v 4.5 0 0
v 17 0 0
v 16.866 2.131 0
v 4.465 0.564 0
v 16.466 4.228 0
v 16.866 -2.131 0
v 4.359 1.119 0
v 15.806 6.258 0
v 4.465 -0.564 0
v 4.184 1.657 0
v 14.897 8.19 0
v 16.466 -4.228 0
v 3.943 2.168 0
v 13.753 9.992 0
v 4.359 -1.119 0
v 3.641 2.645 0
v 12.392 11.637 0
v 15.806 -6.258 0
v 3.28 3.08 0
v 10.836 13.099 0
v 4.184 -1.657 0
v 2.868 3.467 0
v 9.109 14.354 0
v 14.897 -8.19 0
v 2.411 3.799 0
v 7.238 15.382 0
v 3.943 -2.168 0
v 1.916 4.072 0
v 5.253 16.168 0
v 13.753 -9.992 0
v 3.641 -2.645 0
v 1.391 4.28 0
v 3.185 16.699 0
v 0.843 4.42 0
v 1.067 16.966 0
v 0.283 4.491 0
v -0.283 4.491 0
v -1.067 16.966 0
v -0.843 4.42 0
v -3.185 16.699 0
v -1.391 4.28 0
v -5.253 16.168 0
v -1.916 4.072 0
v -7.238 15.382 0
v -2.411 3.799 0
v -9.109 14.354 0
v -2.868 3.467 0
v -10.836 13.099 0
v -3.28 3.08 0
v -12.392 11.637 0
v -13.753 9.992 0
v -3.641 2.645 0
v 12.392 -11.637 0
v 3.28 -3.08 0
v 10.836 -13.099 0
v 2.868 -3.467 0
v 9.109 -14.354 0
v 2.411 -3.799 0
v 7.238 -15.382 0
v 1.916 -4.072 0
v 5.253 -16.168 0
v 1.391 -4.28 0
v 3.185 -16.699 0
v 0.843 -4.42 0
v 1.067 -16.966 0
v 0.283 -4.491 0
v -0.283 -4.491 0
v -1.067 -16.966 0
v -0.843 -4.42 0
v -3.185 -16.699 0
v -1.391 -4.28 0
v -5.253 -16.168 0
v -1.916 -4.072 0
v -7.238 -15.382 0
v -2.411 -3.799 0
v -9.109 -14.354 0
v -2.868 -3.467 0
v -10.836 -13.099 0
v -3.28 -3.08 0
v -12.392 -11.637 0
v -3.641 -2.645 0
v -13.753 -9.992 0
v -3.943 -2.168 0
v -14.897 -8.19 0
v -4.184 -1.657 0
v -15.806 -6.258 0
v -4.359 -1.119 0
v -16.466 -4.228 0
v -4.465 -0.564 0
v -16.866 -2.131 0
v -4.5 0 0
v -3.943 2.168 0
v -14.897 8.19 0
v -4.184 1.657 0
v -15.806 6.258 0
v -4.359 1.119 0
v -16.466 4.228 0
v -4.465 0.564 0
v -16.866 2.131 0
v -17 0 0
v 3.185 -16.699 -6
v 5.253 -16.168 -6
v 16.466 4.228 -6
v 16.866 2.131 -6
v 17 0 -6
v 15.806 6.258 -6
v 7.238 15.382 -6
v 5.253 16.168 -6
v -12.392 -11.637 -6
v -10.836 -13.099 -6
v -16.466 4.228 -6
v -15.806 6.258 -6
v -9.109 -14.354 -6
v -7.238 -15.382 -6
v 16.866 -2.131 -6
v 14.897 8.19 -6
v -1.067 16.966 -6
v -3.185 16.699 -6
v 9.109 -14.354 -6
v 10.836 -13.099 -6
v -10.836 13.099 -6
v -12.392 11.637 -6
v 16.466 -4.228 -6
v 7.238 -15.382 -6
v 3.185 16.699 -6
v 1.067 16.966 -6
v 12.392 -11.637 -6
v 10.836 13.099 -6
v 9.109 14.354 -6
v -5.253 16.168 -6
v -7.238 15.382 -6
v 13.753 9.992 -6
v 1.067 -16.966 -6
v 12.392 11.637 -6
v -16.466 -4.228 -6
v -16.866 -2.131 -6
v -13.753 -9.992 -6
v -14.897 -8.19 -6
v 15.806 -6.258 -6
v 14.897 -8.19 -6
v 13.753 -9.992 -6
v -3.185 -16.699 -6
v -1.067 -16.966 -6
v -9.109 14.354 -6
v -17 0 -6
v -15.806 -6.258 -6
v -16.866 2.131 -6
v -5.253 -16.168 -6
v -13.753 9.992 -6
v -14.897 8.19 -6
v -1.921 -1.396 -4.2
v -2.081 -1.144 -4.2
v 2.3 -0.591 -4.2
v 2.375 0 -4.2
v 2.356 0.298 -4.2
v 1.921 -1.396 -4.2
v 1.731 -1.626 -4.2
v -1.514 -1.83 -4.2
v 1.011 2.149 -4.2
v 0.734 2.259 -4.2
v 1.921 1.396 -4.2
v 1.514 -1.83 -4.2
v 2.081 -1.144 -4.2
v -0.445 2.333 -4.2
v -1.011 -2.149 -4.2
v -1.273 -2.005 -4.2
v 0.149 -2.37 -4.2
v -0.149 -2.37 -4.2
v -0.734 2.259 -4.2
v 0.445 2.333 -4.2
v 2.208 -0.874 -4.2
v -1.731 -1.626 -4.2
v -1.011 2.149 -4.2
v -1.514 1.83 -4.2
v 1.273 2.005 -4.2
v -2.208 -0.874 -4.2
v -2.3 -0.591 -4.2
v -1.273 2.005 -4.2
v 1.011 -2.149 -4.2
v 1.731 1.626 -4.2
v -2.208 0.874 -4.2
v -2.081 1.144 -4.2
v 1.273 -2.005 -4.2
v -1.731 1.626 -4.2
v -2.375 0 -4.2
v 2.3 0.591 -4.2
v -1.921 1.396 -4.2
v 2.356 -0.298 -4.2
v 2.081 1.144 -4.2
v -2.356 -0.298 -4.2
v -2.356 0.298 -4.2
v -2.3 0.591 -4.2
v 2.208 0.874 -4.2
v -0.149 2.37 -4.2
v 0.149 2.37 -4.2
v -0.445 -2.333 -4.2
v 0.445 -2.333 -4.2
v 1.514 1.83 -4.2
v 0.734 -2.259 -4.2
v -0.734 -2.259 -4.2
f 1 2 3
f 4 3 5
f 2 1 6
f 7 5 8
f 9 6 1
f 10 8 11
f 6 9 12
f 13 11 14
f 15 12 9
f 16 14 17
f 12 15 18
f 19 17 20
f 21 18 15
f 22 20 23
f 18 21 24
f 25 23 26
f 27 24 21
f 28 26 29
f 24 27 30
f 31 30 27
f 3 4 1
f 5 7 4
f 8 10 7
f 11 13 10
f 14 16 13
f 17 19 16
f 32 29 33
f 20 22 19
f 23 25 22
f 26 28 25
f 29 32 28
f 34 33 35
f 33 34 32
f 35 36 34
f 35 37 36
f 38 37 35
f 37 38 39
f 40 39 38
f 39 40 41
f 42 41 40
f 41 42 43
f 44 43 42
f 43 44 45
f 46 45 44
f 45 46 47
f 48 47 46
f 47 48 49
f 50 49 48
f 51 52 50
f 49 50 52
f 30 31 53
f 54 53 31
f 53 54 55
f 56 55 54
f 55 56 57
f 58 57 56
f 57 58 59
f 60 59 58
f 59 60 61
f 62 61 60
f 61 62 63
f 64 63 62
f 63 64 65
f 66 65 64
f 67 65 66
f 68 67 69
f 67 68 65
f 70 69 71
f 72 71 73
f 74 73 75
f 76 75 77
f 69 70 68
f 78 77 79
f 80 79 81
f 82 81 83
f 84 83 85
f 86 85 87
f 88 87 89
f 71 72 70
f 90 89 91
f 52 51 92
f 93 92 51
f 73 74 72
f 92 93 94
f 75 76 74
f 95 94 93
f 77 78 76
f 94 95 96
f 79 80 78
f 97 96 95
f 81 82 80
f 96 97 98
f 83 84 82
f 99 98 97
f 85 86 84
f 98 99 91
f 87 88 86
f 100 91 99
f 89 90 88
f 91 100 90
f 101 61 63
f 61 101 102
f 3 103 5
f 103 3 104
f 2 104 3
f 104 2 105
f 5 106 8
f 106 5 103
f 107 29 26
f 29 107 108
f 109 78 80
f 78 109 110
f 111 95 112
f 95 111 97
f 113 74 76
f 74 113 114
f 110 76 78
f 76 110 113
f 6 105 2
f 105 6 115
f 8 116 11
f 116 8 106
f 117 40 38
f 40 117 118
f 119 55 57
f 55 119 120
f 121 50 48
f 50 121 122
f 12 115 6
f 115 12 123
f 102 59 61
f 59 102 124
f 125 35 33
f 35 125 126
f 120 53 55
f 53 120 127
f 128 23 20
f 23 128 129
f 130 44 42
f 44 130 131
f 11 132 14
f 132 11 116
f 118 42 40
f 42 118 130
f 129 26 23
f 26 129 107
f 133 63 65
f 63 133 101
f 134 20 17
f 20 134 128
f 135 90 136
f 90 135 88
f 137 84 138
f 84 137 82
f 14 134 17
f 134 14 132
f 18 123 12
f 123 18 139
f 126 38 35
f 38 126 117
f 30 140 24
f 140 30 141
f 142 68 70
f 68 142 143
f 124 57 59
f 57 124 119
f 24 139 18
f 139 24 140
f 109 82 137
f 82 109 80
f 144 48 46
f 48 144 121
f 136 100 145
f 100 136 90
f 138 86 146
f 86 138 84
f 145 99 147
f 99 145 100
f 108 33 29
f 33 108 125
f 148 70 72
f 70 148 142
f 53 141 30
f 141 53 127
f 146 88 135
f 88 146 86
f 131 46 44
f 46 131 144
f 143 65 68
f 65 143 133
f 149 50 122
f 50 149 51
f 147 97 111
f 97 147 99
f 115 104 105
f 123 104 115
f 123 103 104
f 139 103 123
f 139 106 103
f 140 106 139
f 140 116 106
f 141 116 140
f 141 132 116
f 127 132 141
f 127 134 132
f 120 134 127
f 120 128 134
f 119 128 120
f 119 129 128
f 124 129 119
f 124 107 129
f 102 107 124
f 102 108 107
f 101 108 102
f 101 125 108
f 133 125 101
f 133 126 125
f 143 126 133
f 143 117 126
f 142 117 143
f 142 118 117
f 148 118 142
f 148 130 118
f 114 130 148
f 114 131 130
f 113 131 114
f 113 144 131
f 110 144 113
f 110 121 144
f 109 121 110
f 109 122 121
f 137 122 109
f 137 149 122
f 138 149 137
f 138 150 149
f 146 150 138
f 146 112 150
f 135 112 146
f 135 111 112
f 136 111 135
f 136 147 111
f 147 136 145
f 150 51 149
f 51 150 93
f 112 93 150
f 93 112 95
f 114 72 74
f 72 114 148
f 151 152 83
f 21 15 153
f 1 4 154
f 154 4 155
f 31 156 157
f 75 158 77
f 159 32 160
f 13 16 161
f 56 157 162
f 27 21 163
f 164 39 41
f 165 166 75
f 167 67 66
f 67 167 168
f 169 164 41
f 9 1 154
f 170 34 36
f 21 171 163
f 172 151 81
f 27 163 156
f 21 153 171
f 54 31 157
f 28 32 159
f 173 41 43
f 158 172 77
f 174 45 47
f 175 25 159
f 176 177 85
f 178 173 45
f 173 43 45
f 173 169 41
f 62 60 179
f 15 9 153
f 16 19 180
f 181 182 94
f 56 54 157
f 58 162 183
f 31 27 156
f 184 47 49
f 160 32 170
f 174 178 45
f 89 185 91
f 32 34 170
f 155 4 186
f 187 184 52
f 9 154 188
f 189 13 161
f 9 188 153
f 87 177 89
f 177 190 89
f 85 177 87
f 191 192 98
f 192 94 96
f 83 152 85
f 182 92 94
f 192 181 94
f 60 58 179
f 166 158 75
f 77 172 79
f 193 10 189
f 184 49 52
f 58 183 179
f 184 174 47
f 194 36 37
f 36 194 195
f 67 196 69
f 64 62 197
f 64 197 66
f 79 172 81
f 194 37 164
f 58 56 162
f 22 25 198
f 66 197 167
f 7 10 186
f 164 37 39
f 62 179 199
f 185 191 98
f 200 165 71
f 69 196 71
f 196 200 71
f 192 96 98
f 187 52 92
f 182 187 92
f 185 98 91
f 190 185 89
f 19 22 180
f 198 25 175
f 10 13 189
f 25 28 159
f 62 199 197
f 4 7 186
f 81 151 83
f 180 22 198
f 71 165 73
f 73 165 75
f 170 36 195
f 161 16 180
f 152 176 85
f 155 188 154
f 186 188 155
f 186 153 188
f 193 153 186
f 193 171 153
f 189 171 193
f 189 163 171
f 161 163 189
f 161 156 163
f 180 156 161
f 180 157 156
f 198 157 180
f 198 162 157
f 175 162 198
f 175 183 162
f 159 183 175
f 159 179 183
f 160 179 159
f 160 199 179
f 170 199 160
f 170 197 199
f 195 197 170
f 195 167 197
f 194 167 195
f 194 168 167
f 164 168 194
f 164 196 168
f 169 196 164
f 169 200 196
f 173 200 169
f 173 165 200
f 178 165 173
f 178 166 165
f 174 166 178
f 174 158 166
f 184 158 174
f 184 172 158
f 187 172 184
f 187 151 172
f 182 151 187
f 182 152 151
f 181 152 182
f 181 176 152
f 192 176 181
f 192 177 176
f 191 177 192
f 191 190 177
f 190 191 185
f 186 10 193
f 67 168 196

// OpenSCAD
$fn = 50;


difference() {
	union() {
		translate(v = [0, 0, -3.0000000000]) {
			cylinder(h = 3, r = 7.0000000000);
		}
		translate(v = [0, 0, -6.0000000000]) {
			cylinder(h = 6, r = 17.0000000000);
		}
	}
	union() {
		translate(v = [0, 0, 0]) {
			rotate(a = [0, 0, 0]) {
				difference() {
					union() {
						#translate(v = [0, 0, -3.0000000000]) {
							cylinder(h = 3, r = 2.2500000000);
						}
						#translate(v = [0, 0, -4.2000000000]) {
							cylinder(h = 4.2000000000, r1 = 2.3750000000, r2 = 4.5000000000);
						}
						#translate(v = [0, 0, -3.0000000000]) {
							cylinder(h = 3, r = 2.3750000000);
						}
						#translate(v = [0, 0, -3.0000000000]) {
							cylinder(h = 3, r = 2.2500000000);
						}
					}
					union();
				}
			}
		}
	}
}
